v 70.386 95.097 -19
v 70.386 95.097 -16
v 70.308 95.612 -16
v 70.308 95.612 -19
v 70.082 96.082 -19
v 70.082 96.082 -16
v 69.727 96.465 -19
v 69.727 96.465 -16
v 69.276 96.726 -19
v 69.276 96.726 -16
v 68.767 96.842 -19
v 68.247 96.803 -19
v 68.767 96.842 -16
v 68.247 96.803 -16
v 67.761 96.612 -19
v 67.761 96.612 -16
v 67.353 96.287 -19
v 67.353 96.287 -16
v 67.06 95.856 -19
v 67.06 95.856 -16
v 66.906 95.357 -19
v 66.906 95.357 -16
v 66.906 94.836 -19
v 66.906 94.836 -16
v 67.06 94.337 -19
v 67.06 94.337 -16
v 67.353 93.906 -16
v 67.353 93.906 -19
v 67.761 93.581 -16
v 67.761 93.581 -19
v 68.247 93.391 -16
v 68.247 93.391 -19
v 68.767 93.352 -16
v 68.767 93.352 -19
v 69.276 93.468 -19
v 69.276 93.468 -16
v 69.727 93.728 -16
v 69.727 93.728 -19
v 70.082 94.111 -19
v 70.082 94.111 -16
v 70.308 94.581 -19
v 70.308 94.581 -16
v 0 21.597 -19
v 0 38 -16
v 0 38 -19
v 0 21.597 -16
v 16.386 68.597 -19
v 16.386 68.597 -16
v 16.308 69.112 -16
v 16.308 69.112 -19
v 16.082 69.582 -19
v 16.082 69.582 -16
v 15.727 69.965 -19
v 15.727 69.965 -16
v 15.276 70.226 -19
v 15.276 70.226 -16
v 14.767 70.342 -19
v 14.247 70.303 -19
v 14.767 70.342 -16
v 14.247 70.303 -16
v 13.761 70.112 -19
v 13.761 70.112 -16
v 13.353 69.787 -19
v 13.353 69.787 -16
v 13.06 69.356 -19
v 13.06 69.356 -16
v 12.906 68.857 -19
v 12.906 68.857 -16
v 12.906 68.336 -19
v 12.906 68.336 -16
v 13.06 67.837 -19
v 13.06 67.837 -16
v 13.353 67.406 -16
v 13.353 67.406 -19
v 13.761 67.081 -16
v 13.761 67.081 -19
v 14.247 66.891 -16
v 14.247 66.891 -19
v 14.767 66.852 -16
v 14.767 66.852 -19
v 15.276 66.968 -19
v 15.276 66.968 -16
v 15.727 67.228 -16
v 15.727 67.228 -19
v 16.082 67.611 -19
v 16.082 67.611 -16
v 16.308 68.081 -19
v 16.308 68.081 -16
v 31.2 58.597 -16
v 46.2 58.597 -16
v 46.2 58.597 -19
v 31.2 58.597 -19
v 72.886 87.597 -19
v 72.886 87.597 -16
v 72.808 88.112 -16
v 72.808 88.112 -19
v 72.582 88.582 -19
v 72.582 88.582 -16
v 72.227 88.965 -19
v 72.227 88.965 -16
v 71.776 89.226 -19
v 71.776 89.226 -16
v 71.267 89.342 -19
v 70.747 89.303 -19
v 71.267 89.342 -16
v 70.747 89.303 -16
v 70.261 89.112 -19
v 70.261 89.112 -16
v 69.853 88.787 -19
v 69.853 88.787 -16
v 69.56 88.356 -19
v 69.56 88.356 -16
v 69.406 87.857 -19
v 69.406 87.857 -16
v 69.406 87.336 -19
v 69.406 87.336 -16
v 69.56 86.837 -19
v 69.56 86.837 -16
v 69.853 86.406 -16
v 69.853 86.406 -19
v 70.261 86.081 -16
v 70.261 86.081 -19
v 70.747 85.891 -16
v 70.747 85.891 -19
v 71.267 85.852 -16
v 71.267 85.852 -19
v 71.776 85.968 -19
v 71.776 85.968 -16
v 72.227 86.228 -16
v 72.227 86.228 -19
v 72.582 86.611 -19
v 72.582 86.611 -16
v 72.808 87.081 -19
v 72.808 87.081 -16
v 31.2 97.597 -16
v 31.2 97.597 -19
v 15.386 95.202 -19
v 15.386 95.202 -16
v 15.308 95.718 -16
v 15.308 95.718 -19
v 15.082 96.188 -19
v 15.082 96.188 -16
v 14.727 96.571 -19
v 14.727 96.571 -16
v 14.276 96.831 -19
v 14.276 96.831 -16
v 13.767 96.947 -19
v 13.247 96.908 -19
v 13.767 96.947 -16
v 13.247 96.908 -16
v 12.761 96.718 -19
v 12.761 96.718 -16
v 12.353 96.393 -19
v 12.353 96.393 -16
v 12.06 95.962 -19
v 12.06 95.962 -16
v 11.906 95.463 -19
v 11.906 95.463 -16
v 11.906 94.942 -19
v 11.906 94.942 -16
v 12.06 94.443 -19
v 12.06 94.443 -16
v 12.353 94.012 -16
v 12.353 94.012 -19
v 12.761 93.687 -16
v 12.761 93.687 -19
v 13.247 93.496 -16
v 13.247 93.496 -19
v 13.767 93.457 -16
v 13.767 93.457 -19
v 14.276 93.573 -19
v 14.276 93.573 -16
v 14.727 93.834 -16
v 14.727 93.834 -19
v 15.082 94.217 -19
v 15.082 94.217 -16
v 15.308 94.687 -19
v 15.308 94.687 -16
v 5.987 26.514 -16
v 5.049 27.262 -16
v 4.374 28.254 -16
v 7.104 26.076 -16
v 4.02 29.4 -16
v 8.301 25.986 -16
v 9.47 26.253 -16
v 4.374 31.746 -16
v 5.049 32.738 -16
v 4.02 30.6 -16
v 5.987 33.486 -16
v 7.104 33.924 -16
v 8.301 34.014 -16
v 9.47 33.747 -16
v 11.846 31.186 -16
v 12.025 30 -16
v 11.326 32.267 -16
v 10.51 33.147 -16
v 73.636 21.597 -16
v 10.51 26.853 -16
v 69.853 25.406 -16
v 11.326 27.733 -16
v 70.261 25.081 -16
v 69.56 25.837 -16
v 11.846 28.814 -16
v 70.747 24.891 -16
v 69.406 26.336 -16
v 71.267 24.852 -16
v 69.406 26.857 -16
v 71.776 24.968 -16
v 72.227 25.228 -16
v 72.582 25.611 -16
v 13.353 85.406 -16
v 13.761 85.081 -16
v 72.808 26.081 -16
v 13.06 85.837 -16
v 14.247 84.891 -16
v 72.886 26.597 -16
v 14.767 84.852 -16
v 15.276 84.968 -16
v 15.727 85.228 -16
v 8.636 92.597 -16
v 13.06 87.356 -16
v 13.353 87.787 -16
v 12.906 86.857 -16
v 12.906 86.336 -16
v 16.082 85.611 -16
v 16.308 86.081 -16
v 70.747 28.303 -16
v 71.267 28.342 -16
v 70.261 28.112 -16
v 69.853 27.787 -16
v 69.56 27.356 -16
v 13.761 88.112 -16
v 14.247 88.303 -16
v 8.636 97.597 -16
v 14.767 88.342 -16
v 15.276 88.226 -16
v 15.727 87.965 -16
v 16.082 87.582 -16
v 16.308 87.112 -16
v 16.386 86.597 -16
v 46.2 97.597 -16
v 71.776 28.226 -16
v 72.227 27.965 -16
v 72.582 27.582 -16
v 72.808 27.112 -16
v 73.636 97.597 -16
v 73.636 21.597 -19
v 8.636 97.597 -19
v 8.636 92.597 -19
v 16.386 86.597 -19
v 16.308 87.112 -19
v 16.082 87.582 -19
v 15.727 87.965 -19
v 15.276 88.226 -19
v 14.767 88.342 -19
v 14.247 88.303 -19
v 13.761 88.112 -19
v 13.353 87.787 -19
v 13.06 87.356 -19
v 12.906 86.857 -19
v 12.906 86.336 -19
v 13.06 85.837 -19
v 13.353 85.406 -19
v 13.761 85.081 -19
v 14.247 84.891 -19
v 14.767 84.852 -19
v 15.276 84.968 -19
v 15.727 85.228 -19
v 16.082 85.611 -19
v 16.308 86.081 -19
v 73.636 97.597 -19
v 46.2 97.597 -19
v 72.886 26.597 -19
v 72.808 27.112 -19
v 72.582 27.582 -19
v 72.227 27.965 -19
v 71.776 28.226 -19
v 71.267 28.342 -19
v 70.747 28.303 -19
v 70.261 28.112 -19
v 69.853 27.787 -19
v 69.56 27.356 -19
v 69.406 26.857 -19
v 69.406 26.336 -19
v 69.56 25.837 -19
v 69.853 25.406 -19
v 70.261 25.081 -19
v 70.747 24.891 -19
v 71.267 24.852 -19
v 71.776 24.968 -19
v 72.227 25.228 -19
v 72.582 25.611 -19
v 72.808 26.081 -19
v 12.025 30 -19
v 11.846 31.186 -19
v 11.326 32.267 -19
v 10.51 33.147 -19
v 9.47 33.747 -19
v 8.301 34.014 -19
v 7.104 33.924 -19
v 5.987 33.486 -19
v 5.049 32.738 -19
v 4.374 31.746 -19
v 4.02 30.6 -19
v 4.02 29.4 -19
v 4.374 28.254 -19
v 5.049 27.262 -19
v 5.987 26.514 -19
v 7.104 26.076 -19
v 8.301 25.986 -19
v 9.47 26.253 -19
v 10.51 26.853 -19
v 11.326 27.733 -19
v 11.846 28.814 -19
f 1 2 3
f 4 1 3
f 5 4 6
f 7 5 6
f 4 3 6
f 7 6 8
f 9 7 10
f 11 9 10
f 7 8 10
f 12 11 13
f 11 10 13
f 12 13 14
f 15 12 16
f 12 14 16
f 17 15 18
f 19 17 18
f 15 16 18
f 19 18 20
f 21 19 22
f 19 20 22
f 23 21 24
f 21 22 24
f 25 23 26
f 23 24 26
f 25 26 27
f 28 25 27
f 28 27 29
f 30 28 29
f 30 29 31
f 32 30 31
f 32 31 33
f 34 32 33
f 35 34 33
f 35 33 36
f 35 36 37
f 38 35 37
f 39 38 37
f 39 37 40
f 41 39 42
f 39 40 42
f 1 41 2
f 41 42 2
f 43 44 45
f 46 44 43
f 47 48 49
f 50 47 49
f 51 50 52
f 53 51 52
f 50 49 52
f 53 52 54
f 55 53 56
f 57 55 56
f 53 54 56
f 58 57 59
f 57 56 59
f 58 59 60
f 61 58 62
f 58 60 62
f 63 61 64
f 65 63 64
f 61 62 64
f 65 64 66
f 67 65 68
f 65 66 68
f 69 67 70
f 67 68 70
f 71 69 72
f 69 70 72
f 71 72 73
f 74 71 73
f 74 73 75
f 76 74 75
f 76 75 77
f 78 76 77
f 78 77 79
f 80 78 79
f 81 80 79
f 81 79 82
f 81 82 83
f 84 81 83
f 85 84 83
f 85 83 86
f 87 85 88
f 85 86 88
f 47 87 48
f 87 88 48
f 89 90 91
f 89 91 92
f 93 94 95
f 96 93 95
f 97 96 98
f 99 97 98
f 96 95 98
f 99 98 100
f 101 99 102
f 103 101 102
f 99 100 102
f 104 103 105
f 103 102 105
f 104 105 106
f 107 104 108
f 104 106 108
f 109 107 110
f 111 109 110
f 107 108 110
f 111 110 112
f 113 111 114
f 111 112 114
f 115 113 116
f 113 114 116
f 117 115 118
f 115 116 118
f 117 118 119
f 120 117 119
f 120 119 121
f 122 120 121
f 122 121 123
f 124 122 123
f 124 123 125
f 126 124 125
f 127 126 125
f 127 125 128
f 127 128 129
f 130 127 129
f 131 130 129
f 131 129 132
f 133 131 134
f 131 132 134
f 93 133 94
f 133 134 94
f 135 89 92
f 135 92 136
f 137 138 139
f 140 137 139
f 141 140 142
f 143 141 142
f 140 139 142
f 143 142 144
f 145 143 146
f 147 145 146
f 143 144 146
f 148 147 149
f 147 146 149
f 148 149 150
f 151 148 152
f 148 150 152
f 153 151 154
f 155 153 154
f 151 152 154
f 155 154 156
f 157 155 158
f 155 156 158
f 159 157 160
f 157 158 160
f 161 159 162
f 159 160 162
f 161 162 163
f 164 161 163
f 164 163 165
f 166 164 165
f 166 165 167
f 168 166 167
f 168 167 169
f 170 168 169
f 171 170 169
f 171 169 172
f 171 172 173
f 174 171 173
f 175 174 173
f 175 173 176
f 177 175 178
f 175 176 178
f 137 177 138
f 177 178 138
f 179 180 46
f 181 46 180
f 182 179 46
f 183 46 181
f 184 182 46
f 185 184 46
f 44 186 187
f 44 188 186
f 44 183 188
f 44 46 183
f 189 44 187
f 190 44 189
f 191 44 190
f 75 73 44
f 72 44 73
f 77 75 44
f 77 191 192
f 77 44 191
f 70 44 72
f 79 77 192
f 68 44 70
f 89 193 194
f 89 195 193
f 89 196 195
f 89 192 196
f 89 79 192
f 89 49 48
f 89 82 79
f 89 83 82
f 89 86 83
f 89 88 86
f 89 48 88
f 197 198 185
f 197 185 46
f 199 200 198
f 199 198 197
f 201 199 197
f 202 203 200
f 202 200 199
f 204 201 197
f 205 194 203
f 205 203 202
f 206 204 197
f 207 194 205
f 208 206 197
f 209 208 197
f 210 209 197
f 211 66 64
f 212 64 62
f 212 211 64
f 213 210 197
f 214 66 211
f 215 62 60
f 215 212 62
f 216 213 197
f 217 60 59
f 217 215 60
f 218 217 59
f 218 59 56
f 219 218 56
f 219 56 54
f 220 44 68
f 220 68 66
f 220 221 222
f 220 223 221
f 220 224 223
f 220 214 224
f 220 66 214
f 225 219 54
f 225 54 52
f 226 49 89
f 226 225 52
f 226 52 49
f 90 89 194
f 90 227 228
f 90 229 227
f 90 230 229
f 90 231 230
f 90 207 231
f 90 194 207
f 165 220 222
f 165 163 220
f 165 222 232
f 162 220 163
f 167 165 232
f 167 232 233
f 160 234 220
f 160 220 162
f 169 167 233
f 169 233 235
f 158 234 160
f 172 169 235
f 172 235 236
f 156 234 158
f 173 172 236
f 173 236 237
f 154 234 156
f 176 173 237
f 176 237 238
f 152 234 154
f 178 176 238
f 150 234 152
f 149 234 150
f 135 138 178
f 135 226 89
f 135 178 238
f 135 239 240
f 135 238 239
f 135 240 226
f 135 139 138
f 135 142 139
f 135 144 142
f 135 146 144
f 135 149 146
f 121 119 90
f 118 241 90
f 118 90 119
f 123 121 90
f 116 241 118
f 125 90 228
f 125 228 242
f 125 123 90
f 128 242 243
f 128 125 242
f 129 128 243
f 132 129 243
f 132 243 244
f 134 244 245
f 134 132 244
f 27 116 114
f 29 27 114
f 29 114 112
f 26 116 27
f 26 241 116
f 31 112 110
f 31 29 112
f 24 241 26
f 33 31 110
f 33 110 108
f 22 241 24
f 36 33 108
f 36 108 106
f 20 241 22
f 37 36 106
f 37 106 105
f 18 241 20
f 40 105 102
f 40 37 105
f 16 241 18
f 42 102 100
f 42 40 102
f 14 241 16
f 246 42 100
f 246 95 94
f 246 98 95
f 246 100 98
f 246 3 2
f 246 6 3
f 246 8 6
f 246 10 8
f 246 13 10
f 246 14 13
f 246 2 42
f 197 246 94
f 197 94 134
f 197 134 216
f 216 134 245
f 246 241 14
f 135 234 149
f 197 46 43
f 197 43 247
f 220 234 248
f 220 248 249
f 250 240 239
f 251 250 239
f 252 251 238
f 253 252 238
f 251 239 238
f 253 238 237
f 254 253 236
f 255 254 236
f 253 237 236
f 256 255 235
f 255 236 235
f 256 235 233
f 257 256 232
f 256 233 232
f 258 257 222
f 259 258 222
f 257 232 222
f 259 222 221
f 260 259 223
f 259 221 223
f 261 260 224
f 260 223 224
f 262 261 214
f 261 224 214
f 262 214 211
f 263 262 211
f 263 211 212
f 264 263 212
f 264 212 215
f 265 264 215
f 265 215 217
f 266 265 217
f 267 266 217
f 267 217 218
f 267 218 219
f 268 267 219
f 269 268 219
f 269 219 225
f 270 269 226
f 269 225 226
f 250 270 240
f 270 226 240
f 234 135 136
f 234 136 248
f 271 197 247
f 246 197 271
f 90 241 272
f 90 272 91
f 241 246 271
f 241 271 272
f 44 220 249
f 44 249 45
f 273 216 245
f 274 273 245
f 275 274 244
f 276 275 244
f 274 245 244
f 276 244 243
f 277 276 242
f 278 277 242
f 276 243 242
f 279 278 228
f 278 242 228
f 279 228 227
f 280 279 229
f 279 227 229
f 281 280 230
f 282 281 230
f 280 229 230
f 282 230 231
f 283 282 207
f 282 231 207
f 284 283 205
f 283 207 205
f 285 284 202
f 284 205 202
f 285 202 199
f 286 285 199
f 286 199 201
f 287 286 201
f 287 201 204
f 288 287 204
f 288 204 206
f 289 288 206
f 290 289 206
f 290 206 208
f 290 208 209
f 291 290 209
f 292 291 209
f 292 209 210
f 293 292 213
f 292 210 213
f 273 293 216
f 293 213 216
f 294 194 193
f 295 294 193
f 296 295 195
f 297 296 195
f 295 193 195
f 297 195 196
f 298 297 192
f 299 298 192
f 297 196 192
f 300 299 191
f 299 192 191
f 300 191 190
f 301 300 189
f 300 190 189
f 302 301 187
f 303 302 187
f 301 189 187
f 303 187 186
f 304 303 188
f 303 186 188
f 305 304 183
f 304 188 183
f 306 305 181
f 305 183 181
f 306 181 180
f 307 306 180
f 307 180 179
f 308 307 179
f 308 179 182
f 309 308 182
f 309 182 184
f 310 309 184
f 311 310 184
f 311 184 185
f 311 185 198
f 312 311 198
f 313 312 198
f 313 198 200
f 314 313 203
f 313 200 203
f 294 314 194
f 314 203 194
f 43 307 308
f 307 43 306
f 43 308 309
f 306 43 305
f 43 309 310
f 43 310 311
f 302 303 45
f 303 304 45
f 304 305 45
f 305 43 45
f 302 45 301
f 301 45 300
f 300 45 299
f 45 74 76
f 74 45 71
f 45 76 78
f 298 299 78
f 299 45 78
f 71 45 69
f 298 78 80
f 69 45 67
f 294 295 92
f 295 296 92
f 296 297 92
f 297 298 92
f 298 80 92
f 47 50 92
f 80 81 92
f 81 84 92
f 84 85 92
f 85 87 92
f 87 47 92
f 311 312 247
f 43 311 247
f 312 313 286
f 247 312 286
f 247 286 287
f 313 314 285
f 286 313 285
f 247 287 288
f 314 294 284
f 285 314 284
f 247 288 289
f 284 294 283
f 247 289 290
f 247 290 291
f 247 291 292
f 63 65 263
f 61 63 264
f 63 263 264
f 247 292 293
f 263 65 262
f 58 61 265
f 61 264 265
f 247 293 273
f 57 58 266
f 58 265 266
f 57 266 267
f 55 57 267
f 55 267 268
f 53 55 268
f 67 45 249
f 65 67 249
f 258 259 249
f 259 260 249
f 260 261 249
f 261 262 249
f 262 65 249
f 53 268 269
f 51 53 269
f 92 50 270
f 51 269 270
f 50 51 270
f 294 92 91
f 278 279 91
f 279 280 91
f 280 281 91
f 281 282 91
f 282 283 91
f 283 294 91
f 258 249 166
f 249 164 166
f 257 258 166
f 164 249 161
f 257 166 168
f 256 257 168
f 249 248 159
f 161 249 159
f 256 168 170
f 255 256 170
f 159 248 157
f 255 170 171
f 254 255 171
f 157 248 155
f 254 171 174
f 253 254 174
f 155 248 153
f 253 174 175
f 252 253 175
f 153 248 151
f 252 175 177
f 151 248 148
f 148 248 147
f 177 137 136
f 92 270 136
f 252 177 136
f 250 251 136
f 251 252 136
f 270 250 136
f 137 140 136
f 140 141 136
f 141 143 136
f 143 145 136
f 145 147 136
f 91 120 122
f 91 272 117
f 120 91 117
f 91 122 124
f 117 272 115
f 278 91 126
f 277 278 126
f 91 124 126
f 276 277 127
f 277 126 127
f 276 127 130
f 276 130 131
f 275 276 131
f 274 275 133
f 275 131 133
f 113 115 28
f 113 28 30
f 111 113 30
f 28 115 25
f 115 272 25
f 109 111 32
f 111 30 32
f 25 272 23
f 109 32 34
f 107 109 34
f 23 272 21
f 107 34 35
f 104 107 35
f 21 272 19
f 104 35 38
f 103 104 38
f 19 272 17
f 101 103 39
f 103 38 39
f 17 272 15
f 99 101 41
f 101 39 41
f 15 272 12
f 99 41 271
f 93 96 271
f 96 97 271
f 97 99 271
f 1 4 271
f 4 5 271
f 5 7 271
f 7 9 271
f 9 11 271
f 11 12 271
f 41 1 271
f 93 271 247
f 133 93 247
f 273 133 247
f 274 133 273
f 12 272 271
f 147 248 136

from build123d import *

# Parameters (mm, degrees)
EXTRUDE_START   = -16
SKETCH_1_R      = 1.75
SKETCH_1_R_2    = 4.025
EXTRUDE_1_DEPTH = 3


with BuildPart() as part:
    # ｽｹｯﾁ1 → ﾎﾞｽ - 押し出し1 (new body)
    with BuildSketch(Plane.XY.offset(EXTRUDE_START)):
        Polygon((8.636200269, 92.596668368), (0, 38), (0, 21.596668368), (68.636200269, 21.596668368), (73.636200269, 21.596668368), (73.636200269, 97.596668368), (60, 97.596668368), (46.2, 97.596668368), (46.2, 92.596668368), (46.2, 58.596668368), (31.2, 58.596668368), (31.2, 92.596668368), (31.2, 97.596668368), (8.636200269, 97.596668368), align=None)
        with Locations((14.636200269, 86.596668368)):
            Circle(SKETCH_1_R, mode=Mode.SUBTRACT)
        with Locations((14.636200269, 68.596668368)):
            Circle(SKETCH_1_R, mode=Mode.SUBTRACT)
        with Locations((8, 30)):
            Circle(SKETCH_1_R_2, mode=Mode.SUBTRACT)
        with Locations((71.136200269, 26.596668368)):
            Circle(SKETCH_1_R, mode=Mode.SUBTRACT)
        with Locations((71.136200269, 87.596668368)):
            Circle(SKETCH_1_R, mode=Mode.SUBTRACT)
        with Locations((68.636200269, 95.096668368)):
            Circle(SKETCH_1_R, mode=Mode.SUBTRACT)
        with Locations((13.636200269, 95.202370808)):
            Circle(SKETCH_1_R, mode=Mode.SUBTRACT)
    extrude(amount=-EXTRUDE_1_DEPTH)


solid = part.part
